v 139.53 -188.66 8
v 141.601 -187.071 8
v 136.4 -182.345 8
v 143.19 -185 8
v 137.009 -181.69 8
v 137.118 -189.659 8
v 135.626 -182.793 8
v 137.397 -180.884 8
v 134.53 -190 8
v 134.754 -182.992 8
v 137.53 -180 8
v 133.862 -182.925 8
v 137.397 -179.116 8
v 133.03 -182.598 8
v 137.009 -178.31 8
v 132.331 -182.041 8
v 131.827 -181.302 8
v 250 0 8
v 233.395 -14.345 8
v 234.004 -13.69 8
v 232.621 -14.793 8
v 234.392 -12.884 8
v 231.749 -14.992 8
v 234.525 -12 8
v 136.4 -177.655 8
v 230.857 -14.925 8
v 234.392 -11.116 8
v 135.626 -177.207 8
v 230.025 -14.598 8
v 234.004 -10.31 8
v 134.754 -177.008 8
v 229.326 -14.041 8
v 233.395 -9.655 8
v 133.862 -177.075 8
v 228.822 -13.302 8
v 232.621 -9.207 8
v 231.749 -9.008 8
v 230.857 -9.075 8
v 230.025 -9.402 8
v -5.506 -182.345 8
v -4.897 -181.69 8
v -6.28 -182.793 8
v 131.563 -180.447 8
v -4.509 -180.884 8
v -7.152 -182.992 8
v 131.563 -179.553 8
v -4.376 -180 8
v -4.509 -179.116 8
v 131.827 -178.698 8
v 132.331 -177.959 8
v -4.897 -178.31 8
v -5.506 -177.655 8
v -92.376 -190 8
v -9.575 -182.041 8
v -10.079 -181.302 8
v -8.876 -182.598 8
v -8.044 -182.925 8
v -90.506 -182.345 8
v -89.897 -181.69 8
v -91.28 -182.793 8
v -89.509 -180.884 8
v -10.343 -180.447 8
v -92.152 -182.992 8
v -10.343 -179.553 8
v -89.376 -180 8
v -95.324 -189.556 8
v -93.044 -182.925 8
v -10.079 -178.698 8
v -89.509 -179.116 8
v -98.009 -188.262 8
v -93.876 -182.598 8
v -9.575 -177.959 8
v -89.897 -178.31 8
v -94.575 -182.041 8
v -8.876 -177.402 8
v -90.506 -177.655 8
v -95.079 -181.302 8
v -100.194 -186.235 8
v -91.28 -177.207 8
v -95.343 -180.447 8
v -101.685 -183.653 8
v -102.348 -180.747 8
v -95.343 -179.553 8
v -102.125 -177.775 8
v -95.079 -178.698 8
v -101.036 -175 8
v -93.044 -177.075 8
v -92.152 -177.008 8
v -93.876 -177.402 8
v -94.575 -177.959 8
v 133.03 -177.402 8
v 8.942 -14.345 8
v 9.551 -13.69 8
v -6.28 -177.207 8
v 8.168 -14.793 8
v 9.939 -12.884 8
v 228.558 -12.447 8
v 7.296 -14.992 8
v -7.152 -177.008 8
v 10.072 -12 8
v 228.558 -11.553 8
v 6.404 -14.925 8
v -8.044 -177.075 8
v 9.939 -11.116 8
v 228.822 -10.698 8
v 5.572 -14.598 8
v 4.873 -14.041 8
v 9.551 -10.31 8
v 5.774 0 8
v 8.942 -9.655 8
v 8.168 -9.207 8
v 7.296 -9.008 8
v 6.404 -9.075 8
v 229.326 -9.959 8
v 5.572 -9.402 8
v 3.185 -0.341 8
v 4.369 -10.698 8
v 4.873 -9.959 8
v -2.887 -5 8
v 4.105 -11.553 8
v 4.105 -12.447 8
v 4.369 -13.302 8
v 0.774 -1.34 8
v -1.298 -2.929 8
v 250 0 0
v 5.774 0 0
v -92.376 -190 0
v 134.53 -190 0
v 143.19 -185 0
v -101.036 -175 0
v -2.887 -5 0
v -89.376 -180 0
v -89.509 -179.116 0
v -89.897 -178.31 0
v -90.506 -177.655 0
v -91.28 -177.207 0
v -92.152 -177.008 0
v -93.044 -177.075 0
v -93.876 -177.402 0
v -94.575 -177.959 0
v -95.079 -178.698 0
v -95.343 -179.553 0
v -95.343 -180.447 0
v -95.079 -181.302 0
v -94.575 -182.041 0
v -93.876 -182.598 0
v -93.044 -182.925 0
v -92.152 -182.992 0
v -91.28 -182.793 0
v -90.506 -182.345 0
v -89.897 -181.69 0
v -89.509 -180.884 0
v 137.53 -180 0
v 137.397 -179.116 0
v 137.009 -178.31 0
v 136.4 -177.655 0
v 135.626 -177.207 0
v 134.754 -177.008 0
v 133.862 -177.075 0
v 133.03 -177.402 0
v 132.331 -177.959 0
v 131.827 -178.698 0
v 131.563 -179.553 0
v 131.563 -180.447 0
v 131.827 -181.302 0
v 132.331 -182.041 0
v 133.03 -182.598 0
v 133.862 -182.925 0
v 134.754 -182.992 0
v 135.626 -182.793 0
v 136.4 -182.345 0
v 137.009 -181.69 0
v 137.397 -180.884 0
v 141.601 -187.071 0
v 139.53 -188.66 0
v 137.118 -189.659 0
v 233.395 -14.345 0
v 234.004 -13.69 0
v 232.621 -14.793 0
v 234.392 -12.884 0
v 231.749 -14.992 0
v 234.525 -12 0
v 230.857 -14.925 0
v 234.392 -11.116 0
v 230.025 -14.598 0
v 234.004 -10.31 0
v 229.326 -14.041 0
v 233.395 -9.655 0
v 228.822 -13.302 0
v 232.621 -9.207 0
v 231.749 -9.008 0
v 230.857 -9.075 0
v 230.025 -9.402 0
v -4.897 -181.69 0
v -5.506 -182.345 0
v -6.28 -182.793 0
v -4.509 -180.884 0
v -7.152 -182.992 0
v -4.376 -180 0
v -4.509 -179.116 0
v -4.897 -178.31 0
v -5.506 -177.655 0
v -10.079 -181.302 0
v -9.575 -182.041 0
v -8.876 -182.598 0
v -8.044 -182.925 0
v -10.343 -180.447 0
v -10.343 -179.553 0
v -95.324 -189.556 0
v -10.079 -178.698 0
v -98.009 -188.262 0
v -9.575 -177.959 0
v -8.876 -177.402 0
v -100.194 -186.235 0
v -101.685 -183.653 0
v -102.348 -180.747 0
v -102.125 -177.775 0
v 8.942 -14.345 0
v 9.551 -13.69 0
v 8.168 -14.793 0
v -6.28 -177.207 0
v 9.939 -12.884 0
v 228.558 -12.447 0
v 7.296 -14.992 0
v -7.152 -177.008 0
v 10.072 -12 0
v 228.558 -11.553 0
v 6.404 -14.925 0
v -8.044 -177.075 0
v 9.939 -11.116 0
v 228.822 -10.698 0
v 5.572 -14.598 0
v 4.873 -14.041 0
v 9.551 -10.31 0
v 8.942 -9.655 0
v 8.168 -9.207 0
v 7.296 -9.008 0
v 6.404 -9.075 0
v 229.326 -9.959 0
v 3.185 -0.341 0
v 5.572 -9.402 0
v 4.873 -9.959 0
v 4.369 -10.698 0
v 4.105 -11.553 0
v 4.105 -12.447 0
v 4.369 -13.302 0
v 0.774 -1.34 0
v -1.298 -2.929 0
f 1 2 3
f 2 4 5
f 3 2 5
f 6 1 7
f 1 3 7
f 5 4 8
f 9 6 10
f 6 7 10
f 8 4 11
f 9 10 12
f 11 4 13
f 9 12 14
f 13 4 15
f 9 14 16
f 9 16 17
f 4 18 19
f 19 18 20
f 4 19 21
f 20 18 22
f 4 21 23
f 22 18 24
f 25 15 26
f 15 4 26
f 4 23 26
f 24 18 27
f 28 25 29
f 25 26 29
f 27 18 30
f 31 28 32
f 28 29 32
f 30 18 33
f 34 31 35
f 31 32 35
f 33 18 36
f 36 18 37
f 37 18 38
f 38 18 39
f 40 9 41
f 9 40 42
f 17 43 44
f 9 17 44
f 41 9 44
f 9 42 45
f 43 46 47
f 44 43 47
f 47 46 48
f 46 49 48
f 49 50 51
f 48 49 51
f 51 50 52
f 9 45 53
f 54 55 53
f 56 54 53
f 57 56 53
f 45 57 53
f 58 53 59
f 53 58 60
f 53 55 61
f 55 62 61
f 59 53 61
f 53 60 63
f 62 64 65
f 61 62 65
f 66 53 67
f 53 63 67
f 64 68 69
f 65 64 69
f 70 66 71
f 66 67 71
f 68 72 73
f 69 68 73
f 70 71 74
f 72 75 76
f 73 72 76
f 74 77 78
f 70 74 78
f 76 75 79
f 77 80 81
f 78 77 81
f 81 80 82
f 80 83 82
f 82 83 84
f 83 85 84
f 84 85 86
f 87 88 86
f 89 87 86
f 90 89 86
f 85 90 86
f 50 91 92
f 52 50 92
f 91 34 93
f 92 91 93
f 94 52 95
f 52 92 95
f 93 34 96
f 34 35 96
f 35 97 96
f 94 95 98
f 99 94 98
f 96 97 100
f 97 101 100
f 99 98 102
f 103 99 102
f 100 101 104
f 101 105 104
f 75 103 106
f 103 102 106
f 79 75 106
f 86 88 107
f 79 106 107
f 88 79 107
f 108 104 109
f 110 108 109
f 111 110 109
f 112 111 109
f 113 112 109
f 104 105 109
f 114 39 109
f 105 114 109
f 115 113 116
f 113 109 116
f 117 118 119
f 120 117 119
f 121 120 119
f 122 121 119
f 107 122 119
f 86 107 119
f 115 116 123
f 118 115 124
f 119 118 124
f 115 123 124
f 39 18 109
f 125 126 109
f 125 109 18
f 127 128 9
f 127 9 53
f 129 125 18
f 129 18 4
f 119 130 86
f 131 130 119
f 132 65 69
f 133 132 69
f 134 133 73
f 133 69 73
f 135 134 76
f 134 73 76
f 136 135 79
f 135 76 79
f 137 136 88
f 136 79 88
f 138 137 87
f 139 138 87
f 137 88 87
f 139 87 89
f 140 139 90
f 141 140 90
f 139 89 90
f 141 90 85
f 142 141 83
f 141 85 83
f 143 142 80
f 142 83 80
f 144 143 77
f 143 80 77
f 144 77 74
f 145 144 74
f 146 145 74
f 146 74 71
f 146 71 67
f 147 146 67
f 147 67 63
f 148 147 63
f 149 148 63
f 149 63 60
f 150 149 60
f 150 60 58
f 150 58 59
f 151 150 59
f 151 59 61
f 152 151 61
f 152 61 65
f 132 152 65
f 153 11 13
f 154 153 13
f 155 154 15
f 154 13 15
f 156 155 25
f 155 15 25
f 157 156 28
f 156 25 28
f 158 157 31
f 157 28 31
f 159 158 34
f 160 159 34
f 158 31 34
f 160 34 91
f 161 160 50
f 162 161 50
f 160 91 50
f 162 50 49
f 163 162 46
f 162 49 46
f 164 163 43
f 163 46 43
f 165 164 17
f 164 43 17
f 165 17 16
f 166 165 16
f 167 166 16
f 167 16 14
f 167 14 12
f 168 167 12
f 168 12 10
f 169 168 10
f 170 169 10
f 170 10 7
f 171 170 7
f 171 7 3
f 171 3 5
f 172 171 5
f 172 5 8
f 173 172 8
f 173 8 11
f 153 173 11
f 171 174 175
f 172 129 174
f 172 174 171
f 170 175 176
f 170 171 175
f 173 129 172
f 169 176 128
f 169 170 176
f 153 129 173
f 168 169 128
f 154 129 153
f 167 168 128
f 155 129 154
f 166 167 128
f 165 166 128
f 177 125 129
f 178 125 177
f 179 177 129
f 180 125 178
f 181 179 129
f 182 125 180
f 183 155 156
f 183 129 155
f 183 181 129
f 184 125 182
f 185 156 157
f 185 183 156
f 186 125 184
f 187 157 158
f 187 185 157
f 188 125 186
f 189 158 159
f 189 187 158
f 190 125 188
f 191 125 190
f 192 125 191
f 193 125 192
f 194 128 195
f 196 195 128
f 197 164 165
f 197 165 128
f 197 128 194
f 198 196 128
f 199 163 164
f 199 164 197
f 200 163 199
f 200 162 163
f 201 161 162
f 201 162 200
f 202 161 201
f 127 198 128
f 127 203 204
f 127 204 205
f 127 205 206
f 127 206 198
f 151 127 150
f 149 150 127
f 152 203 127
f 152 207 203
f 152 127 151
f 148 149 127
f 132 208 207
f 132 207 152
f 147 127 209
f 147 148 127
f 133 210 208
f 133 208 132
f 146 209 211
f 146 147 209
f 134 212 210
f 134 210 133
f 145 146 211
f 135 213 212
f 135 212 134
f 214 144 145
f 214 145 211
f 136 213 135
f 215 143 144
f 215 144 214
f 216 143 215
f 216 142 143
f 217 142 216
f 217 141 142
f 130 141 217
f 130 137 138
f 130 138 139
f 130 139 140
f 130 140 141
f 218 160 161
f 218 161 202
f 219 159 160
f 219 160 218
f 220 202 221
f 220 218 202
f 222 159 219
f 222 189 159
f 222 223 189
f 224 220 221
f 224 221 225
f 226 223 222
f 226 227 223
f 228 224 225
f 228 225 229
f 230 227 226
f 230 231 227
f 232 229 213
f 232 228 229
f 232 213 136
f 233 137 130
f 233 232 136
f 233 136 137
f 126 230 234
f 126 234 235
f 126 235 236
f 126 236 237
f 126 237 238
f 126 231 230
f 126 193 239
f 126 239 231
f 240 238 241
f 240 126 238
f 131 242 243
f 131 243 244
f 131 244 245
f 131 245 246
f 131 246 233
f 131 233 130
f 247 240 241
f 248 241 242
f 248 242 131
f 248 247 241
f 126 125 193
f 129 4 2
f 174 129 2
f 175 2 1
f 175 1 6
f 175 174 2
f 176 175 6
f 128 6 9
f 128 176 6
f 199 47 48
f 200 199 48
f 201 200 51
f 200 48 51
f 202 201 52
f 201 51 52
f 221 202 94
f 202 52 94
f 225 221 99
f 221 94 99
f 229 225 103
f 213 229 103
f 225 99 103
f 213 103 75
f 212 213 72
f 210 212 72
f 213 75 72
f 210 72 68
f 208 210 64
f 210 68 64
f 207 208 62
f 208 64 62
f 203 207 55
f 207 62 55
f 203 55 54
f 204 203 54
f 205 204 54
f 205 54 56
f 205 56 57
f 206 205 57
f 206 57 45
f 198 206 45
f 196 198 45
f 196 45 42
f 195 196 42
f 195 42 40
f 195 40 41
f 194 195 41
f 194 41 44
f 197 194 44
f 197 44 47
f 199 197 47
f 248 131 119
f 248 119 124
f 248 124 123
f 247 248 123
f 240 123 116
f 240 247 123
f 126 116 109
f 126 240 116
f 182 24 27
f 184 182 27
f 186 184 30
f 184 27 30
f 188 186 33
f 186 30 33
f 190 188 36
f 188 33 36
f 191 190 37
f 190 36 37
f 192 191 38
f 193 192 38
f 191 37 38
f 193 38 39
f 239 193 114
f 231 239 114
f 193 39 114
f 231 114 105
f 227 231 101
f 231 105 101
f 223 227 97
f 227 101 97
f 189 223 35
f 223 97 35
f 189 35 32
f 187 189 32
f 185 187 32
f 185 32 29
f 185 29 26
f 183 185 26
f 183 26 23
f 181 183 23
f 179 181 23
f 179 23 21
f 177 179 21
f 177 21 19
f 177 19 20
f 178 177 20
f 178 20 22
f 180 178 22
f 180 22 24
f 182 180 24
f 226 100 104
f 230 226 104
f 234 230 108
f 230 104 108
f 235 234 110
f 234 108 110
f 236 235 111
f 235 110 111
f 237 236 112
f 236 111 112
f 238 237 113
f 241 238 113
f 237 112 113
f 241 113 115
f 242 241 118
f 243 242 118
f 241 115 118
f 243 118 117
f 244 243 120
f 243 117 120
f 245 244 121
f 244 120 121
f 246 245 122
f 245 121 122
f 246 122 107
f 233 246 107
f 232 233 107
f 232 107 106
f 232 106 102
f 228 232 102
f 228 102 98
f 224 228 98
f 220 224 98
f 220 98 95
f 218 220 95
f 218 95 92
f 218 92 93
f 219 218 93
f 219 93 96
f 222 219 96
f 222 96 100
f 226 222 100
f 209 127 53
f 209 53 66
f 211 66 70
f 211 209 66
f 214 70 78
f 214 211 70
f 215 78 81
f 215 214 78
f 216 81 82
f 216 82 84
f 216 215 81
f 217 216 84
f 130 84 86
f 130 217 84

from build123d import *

# Parameters (mm, degrees)
BOSS_EXTRU_1_DEPTH      = 8
ESQUISSE2_R             = 3
ENL_V_MAT_EXTRU_1_DEPTH = 1597.033446326


with BuildPart() as part:
    # Esquisse1 → Boss.-Extru.1 (new body)
    with BuildSketch(Plane.XY):
        with BuildLine():
            Line((5.773502692, 0), (250, 0))
            Line((250, 0), (143.1902002, -185))
            ThreePointArc((143.1902002, -185), (139.529946162, -188.660254038), (134.529946162, -190))
            Line((134.529946162, -190), (-92.37604307, -190))
            ThreePointArc((-92.37604307, -190), (-101.036297108, -185), (-101.036297108, -175))
            Line((-101.036297108, -175), (-2.886751346, -5))
            ThreePointArc((-2.886751346, -5), (0.773502692, -1.339745962), (5.773502692, 0))
        make_face()
    extrude(amount=BOSS_EXTRU_1_DEPTH)

    # Esquisse2 → Enlèv. mat.-Extru.1 (cut, through all)
    with BuildSketch(Plane(origin=(-1216.410161514, -630, 8), x_dir=(1, 0, 0), z_dir=(0, 0, 1))):
        with Locations((1124.034118443, 450)):
            Circle(ESQUISSE2_R)
        with Locations((1209.034118443, 450)):
            Circle(ESQUISSE2_R)
        with Locations((1223.481958283, 618)):
            Circle(ESQUISSE2_R)
        with Locations((1447.9349529, 618)):
            Circle(ESQUISSE2_R)
        with Locations((1350.940107676, 450)):
            Circle(ESQUISSE2_R)
    extrude(amount=-ENL_V_MAT_EXTRU_1_DEPTH, mode=Mode.SUBTRACT)


solid = part.part
